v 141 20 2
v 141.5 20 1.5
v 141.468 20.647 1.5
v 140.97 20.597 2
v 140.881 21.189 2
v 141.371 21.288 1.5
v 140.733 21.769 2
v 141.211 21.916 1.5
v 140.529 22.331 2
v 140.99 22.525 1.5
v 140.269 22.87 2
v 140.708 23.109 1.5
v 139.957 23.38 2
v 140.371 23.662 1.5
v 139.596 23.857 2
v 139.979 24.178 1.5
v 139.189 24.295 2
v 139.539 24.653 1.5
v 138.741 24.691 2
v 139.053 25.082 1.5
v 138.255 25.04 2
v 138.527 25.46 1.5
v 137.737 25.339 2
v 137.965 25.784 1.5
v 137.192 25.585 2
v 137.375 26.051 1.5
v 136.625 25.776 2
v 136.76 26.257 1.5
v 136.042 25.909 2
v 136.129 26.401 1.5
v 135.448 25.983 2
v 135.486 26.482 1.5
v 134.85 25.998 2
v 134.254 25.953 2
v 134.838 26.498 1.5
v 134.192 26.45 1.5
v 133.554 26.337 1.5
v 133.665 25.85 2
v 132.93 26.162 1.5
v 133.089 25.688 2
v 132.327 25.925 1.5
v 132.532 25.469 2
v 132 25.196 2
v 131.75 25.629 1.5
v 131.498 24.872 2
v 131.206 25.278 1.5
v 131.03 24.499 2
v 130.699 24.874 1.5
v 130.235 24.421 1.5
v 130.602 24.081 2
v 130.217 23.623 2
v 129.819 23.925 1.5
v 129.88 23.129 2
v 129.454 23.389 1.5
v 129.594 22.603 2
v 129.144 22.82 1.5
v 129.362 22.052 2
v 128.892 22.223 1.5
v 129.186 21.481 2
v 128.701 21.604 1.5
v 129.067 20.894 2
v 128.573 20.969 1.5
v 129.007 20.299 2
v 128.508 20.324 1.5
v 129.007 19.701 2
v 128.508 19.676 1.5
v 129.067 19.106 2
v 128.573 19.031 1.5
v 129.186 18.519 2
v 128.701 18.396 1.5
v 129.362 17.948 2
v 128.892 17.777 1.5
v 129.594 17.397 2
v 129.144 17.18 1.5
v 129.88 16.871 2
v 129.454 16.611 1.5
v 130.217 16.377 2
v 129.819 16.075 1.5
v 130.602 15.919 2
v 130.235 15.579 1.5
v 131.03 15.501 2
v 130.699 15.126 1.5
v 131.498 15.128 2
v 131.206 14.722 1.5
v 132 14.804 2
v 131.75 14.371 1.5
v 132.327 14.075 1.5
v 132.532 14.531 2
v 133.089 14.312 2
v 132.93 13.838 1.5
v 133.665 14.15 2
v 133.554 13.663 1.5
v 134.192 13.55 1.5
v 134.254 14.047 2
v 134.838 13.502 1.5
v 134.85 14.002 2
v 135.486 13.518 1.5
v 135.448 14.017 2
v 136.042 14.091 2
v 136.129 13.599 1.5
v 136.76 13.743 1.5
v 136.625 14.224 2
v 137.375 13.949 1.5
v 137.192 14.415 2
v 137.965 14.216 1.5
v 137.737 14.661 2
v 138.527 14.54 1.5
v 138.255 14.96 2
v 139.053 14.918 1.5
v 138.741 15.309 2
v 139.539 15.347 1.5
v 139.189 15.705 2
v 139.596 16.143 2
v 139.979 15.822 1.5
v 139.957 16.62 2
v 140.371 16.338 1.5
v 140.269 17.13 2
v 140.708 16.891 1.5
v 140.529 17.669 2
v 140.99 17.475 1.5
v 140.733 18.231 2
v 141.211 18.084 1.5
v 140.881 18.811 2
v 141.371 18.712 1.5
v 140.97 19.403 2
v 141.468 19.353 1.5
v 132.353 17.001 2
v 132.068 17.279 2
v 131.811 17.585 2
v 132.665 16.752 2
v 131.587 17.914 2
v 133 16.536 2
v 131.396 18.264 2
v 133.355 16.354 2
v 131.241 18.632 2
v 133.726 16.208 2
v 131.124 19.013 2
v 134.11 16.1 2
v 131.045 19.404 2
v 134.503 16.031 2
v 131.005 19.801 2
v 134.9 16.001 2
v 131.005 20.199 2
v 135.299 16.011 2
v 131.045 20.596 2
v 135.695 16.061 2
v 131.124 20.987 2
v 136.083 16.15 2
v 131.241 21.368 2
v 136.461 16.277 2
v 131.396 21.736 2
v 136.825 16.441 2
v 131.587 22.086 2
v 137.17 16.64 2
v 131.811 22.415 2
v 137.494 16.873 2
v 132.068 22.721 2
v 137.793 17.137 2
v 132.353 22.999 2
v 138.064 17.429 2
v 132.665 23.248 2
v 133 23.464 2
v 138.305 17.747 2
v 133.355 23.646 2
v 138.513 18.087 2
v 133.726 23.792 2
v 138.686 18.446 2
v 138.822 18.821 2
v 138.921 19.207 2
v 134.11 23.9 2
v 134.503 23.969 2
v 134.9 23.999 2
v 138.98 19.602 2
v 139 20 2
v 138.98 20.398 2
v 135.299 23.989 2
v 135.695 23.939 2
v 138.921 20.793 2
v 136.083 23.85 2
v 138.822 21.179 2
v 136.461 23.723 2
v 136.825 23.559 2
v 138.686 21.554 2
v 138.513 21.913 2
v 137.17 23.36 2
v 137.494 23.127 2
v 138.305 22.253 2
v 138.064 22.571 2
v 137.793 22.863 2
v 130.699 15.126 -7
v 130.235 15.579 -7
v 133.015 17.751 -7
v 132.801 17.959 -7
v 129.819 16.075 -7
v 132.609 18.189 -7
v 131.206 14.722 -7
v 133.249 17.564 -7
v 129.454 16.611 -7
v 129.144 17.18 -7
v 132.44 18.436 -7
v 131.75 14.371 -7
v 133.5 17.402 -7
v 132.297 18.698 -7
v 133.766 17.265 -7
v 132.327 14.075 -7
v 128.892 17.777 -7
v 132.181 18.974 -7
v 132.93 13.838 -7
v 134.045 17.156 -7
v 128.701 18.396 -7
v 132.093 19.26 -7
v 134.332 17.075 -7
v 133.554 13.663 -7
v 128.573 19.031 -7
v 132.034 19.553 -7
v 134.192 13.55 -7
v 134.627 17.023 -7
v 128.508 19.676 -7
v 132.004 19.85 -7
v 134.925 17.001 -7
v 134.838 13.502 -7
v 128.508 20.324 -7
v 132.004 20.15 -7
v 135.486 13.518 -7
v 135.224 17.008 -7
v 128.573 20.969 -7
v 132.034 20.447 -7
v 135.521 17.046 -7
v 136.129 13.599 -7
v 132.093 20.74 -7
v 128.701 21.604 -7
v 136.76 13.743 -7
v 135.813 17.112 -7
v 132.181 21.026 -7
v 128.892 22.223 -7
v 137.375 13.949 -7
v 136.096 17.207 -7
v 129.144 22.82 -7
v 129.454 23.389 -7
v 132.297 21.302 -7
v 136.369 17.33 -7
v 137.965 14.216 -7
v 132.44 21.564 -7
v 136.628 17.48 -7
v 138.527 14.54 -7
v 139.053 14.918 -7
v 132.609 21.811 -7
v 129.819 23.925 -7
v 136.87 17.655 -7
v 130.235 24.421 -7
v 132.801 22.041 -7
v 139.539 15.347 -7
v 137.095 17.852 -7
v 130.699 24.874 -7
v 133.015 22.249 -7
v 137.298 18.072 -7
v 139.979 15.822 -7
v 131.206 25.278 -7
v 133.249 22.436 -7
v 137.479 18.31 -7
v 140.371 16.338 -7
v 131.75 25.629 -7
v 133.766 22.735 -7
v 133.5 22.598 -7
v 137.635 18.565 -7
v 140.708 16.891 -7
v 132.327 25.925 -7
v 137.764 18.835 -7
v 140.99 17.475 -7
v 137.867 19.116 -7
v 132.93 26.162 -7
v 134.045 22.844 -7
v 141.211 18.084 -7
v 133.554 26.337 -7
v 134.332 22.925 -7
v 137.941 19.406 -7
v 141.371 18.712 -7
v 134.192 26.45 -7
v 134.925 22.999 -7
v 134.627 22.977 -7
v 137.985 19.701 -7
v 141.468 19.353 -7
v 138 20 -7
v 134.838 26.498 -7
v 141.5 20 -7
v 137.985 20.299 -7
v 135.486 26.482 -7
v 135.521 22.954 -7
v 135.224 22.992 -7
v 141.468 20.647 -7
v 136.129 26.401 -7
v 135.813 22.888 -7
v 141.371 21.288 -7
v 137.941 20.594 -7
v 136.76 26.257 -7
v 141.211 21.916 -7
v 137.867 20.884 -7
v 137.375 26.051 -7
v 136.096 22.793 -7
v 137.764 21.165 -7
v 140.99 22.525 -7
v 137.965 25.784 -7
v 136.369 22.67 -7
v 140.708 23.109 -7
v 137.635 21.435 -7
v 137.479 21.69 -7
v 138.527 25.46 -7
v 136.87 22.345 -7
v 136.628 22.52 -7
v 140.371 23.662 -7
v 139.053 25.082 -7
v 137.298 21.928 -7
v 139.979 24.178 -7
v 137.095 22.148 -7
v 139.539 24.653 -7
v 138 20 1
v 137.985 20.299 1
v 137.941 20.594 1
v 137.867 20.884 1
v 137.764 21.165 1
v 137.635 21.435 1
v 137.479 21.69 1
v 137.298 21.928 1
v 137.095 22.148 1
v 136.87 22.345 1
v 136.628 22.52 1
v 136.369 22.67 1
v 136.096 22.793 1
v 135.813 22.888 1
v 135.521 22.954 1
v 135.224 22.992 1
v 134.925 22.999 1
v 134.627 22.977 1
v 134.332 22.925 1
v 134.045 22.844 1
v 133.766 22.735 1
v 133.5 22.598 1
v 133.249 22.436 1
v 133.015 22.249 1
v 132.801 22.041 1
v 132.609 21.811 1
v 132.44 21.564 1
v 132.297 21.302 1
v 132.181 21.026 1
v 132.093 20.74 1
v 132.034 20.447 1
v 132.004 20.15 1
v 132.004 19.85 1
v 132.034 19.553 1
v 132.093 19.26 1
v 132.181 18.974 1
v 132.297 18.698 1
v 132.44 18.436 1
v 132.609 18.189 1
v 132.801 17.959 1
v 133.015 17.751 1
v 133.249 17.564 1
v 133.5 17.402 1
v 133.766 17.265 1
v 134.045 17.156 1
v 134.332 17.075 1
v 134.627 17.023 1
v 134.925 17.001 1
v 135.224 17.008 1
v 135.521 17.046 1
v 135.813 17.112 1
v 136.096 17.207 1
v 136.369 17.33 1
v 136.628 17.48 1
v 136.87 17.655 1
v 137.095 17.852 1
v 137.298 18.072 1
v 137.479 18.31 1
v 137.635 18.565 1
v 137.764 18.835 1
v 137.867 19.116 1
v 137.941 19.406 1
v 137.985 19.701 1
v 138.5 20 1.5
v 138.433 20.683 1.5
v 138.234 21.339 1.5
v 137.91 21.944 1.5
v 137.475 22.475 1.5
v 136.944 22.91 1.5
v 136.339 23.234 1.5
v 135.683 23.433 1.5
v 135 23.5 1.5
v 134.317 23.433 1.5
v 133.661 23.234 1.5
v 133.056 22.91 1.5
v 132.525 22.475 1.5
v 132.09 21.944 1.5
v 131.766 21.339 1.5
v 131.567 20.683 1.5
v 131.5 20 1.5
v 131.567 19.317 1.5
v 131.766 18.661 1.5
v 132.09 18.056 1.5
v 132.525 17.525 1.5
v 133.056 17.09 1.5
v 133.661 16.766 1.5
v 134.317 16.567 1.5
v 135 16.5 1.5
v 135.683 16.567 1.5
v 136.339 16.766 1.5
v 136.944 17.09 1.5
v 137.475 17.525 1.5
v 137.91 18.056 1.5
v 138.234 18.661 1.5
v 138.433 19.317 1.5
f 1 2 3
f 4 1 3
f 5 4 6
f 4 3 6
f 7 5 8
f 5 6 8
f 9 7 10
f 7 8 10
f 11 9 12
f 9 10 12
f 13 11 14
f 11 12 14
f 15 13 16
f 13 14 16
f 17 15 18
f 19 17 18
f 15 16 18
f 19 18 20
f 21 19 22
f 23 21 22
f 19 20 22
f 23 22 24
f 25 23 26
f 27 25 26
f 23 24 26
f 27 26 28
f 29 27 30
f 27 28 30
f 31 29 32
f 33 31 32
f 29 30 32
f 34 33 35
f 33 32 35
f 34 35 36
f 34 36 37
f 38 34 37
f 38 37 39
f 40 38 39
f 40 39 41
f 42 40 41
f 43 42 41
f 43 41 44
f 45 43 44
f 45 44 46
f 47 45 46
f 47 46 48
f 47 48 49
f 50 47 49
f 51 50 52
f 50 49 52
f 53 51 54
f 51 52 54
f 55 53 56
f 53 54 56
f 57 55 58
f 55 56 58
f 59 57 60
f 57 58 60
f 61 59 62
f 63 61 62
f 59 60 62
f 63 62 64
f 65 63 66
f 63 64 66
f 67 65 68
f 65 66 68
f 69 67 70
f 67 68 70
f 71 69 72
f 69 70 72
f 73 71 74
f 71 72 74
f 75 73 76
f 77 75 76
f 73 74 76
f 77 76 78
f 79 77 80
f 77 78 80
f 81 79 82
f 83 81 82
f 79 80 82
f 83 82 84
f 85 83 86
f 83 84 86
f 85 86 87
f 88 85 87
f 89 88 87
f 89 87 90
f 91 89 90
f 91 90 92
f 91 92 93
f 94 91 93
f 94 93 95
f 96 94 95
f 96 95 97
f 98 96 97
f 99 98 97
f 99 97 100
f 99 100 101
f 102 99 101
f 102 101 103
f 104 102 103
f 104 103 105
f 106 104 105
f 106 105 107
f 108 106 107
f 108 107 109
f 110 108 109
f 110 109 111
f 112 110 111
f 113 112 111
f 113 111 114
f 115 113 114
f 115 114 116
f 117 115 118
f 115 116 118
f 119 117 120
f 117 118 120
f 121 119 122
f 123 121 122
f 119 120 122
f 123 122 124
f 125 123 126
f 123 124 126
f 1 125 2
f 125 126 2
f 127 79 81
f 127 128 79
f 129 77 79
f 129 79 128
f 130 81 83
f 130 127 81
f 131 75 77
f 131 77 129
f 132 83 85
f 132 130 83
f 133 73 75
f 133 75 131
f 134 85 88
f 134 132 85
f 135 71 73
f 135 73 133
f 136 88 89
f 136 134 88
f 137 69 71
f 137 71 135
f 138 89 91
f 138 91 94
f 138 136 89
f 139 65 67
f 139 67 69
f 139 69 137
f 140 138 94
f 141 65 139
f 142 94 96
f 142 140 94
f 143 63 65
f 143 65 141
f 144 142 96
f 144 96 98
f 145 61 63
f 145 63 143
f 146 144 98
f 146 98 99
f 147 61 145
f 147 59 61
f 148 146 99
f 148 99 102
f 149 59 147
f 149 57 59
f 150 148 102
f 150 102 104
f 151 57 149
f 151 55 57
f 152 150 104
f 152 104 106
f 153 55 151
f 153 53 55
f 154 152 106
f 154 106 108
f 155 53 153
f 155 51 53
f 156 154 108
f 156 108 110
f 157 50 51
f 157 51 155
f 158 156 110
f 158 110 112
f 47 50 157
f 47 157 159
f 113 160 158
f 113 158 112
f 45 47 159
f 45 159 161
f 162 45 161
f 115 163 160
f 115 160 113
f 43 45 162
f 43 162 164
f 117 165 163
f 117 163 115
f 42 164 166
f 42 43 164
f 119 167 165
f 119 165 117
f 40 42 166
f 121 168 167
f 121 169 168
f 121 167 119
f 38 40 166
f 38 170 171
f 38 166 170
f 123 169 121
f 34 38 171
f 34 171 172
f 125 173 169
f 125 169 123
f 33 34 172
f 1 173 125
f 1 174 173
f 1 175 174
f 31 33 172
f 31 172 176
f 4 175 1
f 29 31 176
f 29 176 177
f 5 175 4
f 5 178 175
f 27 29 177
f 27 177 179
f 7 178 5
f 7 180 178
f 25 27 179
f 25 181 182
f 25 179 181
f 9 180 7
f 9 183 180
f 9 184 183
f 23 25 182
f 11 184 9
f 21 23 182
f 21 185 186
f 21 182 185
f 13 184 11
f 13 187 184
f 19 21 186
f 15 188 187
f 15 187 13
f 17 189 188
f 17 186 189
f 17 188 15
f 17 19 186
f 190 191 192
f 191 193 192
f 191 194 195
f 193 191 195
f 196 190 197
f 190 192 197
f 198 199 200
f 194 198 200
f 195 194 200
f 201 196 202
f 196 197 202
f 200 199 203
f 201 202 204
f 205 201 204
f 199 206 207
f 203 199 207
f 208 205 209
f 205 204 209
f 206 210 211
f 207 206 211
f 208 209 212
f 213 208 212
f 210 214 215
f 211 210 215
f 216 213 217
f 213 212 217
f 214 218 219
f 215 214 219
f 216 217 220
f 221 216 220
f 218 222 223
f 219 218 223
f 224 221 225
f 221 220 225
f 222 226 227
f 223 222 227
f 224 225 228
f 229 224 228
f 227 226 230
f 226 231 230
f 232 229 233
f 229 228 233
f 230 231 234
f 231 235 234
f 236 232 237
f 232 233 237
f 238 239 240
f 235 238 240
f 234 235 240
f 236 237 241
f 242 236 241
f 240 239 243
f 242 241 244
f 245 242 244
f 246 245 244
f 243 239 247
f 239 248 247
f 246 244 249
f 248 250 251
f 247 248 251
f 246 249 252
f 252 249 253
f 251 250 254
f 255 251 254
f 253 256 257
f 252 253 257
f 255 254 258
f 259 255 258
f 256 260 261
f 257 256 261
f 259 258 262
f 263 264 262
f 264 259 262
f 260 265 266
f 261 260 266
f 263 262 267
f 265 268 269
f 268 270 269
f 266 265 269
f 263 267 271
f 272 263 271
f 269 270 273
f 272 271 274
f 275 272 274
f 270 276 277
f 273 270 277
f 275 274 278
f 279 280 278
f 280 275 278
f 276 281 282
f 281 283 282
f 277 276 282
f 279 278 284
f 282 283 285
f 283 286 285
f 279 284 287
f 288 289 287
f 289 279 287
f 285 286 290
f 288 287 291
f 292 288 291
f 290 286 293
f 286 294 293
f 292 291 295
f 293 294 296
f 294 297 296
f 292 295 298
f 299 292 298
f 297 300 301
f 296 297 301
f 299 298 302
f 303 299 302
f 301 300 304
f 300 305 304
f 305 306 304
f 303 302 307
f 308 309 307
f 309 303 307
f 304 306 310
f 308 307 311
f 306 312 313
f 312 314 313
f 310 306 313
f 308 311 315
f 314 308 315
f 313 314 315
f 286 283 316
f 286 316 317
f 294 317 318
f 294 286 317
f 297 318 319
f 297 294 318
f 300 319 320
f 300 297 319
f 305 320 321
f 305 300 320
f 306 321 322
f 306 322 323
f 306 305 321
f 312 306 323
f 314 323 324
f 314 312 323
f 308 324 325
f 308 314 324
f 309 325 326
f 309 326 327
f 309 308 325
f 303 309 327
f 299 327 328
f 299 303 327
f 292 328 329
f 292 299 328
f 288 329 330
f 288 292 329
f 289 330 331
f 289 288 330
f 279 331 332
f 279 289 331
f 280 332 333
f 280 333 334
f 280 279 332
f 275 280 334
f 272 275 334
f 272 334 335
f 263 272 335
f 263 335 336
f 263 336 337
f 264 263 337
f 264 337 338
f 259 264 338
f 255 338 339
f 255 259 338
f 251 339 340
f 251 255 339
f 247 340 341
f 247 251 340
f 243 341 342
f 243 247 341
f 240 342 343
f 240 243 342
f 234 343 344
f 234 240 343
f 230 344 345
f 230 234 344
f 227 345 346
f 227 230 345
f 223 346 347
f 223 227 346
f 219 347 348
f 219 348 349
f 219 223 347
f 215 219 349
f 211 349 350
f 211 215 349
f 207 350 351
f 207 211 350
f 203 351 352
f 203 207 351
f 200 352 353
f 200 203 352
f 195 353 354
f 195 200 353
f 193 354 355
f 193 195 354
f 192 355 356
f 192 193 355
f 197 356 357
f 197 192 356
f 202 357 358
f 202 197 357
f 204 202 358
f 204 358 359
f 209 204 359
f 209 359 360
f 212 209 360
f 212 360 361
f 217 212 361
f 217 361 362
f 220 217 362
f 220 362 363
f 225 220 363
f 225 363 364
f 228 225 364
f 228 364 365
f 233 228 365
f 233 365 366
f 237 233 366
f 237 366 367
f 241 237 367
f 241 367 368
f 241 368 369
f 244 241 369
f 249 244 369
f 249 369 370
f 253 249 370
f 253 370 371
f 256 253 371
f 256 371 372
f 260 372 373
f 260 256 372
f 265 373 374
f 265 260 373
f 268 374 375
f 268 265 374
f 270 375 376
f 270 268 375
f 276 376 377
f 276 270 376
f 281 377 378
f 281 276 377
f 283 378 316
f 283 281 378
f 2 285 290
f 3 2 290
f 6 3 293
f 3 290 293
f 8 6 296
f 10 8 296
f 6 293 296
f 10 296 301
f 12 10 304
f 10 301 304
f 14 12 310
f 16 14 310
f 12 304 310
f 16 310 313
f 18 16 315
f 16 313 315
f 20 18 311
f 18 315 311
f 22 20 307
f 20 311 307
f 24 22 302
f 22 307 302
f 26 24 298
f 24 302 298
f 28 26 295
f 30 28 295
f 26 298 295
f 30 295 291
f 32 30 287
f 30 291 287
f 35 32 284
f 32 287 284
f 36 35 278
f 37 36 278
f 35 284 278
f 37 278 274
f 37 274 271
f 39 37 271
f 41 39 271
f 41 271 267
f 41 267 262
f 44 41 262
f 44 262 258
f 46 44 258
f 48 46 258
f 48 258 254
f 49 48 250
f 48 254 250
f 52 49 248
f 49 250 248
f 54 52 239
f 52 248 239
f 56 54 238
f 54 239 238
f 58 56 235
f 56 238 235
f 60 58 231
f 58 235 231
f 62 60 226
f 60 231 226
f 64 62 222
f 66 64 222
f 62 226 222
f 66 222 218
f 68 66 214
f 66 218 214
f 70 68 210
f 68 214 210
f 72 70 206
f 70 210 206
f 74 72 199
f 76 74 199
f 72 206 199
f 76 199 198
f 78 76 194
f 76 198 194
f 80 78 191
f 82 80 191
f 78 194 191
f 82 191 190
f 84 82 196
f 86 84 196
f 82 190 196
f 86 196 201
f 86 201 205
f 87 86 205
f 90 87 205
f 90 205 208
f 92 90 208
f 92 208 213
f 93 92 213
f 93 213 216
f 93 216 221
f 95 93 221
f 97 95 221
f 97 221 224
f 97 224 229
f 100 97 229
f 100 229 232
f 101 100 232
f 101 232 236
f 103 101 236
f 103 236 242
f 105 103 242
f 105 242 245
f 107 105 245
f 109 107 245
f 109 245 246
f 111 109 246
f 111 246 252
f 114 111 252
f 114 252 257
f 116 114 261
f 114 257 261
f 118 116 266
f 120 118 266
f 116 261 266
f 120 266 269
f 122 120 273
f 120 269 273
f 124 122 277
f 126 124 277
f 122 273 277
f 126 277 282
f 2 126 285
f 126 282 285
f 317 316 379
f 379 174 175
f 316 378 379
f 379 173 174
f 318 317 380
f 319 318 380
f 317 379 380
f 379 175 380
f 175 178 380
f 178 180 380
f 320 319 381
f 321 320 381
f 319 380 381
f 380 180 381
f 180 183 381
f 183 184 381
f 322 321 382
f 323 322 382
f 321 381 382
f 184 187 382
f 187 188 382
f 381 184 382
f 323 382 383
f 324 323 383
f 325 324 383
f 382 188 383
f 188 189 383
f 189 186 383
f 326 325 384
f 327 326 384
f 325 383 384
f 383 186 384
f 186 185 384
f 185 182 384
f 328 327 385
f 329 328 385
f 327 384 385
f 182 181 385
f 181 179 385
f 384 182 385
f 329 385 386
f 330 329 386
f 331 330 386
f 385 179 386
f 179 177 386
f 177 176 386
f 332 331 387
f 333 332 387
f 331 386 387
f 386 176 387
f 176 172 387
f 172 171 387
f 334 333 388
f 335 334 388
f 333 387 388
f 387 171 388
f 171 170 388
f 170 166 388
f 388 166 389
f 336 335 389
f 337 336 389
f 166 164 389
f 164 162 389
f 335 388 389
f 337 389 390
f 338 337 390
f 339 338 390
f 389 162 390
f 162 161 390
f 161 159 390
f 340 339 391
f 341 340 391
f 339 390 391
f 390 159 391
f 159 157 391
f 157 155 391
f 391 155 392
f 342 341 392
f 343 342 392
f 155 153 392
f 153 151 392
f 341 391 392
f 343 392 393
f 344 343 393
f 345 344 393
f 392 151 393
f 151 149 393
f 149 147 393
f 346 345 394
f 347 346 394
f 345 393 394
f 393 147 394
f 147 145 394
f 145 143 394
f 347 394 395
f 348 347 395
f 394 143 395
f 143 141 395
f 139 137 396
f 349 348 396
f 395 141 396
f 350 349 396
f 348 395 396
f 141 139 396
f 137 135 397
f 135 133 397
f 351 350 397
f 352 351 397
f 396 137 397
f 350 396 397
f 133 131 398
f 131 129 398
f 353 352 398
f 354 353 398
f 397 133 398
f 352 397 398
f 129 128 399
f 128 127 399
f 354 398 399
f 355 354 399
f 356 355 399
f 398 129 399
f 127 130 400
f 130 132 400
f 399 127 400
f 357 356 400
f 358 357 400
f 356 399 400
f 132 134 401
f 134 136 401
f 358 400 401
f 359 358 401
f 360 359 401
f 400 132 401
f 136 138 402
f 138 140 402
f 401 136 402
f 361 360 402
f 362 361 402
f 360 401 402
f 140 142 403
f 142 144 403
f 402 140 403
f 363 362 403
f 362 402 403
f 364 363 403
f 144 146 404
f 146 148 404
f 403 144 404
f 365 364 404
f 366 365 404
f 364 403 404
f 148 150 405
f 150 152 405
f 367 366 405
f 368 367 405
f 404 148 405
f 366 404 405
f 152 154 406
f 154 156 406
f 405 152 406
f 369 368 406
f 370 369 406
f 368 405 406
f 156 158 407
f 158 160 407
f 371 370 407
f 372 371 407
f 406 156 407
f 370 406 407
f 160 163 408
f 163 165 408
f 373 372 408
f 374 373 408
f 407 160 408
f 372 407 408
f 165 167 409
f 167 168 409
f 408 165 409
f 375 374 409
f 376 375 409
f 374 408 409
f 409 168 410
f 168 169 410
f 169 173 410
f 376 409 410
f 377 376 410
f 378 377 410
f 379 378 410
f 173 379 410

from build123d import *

# Parameters (mm, degrees)
EXTRUDE_1_DEPTH      = 2
EXTRUDE_1_DEPTH_BACK = 7
SKETCH_1_R           = 6.5
SKETCH_1_R_2         = 3
CHAMFER_1_SIZE       = 1
CHAMFER_2_SIZE       = 0.5


with BuildPart() as part:
    # Эскиз1 → Бобышка-Вытянуть1 (new, two sides: drawn at the far end of the back side and taken through both)
    with BuildSketch(Plane.XY.offset(-EXTRUDE_1_DEPTH_BACK)):
        with Locations((135, 20)):
            Circle(SKETCH_1_R)
        with Locations((135, 20)):
            Circle(SKETCH_1_R_2, mode=Mode.SUBTRACT)
    extrude(amount=EXTRUDE_1_DEPTH + EXTRUDE_1_DEPTH_BACK)

    # Фаска1
    chamfer_1_edges = [part.edges().sort_by_distance(p)[0] for p in [
        (132, 20, 2),
    ]]
    chamfer(chamfer_1_edges, length=CHAMFER_1_SIZE)

    # Фаска2
    chamfer_2_edges = [part.edges().sort_by_distance(p)[0] for p in [
        (128.5, 20, 2),
    ]]
    chamfer(chamfer_2_edges, length=CHAMFER_2_SIZE)


solid = part.part
